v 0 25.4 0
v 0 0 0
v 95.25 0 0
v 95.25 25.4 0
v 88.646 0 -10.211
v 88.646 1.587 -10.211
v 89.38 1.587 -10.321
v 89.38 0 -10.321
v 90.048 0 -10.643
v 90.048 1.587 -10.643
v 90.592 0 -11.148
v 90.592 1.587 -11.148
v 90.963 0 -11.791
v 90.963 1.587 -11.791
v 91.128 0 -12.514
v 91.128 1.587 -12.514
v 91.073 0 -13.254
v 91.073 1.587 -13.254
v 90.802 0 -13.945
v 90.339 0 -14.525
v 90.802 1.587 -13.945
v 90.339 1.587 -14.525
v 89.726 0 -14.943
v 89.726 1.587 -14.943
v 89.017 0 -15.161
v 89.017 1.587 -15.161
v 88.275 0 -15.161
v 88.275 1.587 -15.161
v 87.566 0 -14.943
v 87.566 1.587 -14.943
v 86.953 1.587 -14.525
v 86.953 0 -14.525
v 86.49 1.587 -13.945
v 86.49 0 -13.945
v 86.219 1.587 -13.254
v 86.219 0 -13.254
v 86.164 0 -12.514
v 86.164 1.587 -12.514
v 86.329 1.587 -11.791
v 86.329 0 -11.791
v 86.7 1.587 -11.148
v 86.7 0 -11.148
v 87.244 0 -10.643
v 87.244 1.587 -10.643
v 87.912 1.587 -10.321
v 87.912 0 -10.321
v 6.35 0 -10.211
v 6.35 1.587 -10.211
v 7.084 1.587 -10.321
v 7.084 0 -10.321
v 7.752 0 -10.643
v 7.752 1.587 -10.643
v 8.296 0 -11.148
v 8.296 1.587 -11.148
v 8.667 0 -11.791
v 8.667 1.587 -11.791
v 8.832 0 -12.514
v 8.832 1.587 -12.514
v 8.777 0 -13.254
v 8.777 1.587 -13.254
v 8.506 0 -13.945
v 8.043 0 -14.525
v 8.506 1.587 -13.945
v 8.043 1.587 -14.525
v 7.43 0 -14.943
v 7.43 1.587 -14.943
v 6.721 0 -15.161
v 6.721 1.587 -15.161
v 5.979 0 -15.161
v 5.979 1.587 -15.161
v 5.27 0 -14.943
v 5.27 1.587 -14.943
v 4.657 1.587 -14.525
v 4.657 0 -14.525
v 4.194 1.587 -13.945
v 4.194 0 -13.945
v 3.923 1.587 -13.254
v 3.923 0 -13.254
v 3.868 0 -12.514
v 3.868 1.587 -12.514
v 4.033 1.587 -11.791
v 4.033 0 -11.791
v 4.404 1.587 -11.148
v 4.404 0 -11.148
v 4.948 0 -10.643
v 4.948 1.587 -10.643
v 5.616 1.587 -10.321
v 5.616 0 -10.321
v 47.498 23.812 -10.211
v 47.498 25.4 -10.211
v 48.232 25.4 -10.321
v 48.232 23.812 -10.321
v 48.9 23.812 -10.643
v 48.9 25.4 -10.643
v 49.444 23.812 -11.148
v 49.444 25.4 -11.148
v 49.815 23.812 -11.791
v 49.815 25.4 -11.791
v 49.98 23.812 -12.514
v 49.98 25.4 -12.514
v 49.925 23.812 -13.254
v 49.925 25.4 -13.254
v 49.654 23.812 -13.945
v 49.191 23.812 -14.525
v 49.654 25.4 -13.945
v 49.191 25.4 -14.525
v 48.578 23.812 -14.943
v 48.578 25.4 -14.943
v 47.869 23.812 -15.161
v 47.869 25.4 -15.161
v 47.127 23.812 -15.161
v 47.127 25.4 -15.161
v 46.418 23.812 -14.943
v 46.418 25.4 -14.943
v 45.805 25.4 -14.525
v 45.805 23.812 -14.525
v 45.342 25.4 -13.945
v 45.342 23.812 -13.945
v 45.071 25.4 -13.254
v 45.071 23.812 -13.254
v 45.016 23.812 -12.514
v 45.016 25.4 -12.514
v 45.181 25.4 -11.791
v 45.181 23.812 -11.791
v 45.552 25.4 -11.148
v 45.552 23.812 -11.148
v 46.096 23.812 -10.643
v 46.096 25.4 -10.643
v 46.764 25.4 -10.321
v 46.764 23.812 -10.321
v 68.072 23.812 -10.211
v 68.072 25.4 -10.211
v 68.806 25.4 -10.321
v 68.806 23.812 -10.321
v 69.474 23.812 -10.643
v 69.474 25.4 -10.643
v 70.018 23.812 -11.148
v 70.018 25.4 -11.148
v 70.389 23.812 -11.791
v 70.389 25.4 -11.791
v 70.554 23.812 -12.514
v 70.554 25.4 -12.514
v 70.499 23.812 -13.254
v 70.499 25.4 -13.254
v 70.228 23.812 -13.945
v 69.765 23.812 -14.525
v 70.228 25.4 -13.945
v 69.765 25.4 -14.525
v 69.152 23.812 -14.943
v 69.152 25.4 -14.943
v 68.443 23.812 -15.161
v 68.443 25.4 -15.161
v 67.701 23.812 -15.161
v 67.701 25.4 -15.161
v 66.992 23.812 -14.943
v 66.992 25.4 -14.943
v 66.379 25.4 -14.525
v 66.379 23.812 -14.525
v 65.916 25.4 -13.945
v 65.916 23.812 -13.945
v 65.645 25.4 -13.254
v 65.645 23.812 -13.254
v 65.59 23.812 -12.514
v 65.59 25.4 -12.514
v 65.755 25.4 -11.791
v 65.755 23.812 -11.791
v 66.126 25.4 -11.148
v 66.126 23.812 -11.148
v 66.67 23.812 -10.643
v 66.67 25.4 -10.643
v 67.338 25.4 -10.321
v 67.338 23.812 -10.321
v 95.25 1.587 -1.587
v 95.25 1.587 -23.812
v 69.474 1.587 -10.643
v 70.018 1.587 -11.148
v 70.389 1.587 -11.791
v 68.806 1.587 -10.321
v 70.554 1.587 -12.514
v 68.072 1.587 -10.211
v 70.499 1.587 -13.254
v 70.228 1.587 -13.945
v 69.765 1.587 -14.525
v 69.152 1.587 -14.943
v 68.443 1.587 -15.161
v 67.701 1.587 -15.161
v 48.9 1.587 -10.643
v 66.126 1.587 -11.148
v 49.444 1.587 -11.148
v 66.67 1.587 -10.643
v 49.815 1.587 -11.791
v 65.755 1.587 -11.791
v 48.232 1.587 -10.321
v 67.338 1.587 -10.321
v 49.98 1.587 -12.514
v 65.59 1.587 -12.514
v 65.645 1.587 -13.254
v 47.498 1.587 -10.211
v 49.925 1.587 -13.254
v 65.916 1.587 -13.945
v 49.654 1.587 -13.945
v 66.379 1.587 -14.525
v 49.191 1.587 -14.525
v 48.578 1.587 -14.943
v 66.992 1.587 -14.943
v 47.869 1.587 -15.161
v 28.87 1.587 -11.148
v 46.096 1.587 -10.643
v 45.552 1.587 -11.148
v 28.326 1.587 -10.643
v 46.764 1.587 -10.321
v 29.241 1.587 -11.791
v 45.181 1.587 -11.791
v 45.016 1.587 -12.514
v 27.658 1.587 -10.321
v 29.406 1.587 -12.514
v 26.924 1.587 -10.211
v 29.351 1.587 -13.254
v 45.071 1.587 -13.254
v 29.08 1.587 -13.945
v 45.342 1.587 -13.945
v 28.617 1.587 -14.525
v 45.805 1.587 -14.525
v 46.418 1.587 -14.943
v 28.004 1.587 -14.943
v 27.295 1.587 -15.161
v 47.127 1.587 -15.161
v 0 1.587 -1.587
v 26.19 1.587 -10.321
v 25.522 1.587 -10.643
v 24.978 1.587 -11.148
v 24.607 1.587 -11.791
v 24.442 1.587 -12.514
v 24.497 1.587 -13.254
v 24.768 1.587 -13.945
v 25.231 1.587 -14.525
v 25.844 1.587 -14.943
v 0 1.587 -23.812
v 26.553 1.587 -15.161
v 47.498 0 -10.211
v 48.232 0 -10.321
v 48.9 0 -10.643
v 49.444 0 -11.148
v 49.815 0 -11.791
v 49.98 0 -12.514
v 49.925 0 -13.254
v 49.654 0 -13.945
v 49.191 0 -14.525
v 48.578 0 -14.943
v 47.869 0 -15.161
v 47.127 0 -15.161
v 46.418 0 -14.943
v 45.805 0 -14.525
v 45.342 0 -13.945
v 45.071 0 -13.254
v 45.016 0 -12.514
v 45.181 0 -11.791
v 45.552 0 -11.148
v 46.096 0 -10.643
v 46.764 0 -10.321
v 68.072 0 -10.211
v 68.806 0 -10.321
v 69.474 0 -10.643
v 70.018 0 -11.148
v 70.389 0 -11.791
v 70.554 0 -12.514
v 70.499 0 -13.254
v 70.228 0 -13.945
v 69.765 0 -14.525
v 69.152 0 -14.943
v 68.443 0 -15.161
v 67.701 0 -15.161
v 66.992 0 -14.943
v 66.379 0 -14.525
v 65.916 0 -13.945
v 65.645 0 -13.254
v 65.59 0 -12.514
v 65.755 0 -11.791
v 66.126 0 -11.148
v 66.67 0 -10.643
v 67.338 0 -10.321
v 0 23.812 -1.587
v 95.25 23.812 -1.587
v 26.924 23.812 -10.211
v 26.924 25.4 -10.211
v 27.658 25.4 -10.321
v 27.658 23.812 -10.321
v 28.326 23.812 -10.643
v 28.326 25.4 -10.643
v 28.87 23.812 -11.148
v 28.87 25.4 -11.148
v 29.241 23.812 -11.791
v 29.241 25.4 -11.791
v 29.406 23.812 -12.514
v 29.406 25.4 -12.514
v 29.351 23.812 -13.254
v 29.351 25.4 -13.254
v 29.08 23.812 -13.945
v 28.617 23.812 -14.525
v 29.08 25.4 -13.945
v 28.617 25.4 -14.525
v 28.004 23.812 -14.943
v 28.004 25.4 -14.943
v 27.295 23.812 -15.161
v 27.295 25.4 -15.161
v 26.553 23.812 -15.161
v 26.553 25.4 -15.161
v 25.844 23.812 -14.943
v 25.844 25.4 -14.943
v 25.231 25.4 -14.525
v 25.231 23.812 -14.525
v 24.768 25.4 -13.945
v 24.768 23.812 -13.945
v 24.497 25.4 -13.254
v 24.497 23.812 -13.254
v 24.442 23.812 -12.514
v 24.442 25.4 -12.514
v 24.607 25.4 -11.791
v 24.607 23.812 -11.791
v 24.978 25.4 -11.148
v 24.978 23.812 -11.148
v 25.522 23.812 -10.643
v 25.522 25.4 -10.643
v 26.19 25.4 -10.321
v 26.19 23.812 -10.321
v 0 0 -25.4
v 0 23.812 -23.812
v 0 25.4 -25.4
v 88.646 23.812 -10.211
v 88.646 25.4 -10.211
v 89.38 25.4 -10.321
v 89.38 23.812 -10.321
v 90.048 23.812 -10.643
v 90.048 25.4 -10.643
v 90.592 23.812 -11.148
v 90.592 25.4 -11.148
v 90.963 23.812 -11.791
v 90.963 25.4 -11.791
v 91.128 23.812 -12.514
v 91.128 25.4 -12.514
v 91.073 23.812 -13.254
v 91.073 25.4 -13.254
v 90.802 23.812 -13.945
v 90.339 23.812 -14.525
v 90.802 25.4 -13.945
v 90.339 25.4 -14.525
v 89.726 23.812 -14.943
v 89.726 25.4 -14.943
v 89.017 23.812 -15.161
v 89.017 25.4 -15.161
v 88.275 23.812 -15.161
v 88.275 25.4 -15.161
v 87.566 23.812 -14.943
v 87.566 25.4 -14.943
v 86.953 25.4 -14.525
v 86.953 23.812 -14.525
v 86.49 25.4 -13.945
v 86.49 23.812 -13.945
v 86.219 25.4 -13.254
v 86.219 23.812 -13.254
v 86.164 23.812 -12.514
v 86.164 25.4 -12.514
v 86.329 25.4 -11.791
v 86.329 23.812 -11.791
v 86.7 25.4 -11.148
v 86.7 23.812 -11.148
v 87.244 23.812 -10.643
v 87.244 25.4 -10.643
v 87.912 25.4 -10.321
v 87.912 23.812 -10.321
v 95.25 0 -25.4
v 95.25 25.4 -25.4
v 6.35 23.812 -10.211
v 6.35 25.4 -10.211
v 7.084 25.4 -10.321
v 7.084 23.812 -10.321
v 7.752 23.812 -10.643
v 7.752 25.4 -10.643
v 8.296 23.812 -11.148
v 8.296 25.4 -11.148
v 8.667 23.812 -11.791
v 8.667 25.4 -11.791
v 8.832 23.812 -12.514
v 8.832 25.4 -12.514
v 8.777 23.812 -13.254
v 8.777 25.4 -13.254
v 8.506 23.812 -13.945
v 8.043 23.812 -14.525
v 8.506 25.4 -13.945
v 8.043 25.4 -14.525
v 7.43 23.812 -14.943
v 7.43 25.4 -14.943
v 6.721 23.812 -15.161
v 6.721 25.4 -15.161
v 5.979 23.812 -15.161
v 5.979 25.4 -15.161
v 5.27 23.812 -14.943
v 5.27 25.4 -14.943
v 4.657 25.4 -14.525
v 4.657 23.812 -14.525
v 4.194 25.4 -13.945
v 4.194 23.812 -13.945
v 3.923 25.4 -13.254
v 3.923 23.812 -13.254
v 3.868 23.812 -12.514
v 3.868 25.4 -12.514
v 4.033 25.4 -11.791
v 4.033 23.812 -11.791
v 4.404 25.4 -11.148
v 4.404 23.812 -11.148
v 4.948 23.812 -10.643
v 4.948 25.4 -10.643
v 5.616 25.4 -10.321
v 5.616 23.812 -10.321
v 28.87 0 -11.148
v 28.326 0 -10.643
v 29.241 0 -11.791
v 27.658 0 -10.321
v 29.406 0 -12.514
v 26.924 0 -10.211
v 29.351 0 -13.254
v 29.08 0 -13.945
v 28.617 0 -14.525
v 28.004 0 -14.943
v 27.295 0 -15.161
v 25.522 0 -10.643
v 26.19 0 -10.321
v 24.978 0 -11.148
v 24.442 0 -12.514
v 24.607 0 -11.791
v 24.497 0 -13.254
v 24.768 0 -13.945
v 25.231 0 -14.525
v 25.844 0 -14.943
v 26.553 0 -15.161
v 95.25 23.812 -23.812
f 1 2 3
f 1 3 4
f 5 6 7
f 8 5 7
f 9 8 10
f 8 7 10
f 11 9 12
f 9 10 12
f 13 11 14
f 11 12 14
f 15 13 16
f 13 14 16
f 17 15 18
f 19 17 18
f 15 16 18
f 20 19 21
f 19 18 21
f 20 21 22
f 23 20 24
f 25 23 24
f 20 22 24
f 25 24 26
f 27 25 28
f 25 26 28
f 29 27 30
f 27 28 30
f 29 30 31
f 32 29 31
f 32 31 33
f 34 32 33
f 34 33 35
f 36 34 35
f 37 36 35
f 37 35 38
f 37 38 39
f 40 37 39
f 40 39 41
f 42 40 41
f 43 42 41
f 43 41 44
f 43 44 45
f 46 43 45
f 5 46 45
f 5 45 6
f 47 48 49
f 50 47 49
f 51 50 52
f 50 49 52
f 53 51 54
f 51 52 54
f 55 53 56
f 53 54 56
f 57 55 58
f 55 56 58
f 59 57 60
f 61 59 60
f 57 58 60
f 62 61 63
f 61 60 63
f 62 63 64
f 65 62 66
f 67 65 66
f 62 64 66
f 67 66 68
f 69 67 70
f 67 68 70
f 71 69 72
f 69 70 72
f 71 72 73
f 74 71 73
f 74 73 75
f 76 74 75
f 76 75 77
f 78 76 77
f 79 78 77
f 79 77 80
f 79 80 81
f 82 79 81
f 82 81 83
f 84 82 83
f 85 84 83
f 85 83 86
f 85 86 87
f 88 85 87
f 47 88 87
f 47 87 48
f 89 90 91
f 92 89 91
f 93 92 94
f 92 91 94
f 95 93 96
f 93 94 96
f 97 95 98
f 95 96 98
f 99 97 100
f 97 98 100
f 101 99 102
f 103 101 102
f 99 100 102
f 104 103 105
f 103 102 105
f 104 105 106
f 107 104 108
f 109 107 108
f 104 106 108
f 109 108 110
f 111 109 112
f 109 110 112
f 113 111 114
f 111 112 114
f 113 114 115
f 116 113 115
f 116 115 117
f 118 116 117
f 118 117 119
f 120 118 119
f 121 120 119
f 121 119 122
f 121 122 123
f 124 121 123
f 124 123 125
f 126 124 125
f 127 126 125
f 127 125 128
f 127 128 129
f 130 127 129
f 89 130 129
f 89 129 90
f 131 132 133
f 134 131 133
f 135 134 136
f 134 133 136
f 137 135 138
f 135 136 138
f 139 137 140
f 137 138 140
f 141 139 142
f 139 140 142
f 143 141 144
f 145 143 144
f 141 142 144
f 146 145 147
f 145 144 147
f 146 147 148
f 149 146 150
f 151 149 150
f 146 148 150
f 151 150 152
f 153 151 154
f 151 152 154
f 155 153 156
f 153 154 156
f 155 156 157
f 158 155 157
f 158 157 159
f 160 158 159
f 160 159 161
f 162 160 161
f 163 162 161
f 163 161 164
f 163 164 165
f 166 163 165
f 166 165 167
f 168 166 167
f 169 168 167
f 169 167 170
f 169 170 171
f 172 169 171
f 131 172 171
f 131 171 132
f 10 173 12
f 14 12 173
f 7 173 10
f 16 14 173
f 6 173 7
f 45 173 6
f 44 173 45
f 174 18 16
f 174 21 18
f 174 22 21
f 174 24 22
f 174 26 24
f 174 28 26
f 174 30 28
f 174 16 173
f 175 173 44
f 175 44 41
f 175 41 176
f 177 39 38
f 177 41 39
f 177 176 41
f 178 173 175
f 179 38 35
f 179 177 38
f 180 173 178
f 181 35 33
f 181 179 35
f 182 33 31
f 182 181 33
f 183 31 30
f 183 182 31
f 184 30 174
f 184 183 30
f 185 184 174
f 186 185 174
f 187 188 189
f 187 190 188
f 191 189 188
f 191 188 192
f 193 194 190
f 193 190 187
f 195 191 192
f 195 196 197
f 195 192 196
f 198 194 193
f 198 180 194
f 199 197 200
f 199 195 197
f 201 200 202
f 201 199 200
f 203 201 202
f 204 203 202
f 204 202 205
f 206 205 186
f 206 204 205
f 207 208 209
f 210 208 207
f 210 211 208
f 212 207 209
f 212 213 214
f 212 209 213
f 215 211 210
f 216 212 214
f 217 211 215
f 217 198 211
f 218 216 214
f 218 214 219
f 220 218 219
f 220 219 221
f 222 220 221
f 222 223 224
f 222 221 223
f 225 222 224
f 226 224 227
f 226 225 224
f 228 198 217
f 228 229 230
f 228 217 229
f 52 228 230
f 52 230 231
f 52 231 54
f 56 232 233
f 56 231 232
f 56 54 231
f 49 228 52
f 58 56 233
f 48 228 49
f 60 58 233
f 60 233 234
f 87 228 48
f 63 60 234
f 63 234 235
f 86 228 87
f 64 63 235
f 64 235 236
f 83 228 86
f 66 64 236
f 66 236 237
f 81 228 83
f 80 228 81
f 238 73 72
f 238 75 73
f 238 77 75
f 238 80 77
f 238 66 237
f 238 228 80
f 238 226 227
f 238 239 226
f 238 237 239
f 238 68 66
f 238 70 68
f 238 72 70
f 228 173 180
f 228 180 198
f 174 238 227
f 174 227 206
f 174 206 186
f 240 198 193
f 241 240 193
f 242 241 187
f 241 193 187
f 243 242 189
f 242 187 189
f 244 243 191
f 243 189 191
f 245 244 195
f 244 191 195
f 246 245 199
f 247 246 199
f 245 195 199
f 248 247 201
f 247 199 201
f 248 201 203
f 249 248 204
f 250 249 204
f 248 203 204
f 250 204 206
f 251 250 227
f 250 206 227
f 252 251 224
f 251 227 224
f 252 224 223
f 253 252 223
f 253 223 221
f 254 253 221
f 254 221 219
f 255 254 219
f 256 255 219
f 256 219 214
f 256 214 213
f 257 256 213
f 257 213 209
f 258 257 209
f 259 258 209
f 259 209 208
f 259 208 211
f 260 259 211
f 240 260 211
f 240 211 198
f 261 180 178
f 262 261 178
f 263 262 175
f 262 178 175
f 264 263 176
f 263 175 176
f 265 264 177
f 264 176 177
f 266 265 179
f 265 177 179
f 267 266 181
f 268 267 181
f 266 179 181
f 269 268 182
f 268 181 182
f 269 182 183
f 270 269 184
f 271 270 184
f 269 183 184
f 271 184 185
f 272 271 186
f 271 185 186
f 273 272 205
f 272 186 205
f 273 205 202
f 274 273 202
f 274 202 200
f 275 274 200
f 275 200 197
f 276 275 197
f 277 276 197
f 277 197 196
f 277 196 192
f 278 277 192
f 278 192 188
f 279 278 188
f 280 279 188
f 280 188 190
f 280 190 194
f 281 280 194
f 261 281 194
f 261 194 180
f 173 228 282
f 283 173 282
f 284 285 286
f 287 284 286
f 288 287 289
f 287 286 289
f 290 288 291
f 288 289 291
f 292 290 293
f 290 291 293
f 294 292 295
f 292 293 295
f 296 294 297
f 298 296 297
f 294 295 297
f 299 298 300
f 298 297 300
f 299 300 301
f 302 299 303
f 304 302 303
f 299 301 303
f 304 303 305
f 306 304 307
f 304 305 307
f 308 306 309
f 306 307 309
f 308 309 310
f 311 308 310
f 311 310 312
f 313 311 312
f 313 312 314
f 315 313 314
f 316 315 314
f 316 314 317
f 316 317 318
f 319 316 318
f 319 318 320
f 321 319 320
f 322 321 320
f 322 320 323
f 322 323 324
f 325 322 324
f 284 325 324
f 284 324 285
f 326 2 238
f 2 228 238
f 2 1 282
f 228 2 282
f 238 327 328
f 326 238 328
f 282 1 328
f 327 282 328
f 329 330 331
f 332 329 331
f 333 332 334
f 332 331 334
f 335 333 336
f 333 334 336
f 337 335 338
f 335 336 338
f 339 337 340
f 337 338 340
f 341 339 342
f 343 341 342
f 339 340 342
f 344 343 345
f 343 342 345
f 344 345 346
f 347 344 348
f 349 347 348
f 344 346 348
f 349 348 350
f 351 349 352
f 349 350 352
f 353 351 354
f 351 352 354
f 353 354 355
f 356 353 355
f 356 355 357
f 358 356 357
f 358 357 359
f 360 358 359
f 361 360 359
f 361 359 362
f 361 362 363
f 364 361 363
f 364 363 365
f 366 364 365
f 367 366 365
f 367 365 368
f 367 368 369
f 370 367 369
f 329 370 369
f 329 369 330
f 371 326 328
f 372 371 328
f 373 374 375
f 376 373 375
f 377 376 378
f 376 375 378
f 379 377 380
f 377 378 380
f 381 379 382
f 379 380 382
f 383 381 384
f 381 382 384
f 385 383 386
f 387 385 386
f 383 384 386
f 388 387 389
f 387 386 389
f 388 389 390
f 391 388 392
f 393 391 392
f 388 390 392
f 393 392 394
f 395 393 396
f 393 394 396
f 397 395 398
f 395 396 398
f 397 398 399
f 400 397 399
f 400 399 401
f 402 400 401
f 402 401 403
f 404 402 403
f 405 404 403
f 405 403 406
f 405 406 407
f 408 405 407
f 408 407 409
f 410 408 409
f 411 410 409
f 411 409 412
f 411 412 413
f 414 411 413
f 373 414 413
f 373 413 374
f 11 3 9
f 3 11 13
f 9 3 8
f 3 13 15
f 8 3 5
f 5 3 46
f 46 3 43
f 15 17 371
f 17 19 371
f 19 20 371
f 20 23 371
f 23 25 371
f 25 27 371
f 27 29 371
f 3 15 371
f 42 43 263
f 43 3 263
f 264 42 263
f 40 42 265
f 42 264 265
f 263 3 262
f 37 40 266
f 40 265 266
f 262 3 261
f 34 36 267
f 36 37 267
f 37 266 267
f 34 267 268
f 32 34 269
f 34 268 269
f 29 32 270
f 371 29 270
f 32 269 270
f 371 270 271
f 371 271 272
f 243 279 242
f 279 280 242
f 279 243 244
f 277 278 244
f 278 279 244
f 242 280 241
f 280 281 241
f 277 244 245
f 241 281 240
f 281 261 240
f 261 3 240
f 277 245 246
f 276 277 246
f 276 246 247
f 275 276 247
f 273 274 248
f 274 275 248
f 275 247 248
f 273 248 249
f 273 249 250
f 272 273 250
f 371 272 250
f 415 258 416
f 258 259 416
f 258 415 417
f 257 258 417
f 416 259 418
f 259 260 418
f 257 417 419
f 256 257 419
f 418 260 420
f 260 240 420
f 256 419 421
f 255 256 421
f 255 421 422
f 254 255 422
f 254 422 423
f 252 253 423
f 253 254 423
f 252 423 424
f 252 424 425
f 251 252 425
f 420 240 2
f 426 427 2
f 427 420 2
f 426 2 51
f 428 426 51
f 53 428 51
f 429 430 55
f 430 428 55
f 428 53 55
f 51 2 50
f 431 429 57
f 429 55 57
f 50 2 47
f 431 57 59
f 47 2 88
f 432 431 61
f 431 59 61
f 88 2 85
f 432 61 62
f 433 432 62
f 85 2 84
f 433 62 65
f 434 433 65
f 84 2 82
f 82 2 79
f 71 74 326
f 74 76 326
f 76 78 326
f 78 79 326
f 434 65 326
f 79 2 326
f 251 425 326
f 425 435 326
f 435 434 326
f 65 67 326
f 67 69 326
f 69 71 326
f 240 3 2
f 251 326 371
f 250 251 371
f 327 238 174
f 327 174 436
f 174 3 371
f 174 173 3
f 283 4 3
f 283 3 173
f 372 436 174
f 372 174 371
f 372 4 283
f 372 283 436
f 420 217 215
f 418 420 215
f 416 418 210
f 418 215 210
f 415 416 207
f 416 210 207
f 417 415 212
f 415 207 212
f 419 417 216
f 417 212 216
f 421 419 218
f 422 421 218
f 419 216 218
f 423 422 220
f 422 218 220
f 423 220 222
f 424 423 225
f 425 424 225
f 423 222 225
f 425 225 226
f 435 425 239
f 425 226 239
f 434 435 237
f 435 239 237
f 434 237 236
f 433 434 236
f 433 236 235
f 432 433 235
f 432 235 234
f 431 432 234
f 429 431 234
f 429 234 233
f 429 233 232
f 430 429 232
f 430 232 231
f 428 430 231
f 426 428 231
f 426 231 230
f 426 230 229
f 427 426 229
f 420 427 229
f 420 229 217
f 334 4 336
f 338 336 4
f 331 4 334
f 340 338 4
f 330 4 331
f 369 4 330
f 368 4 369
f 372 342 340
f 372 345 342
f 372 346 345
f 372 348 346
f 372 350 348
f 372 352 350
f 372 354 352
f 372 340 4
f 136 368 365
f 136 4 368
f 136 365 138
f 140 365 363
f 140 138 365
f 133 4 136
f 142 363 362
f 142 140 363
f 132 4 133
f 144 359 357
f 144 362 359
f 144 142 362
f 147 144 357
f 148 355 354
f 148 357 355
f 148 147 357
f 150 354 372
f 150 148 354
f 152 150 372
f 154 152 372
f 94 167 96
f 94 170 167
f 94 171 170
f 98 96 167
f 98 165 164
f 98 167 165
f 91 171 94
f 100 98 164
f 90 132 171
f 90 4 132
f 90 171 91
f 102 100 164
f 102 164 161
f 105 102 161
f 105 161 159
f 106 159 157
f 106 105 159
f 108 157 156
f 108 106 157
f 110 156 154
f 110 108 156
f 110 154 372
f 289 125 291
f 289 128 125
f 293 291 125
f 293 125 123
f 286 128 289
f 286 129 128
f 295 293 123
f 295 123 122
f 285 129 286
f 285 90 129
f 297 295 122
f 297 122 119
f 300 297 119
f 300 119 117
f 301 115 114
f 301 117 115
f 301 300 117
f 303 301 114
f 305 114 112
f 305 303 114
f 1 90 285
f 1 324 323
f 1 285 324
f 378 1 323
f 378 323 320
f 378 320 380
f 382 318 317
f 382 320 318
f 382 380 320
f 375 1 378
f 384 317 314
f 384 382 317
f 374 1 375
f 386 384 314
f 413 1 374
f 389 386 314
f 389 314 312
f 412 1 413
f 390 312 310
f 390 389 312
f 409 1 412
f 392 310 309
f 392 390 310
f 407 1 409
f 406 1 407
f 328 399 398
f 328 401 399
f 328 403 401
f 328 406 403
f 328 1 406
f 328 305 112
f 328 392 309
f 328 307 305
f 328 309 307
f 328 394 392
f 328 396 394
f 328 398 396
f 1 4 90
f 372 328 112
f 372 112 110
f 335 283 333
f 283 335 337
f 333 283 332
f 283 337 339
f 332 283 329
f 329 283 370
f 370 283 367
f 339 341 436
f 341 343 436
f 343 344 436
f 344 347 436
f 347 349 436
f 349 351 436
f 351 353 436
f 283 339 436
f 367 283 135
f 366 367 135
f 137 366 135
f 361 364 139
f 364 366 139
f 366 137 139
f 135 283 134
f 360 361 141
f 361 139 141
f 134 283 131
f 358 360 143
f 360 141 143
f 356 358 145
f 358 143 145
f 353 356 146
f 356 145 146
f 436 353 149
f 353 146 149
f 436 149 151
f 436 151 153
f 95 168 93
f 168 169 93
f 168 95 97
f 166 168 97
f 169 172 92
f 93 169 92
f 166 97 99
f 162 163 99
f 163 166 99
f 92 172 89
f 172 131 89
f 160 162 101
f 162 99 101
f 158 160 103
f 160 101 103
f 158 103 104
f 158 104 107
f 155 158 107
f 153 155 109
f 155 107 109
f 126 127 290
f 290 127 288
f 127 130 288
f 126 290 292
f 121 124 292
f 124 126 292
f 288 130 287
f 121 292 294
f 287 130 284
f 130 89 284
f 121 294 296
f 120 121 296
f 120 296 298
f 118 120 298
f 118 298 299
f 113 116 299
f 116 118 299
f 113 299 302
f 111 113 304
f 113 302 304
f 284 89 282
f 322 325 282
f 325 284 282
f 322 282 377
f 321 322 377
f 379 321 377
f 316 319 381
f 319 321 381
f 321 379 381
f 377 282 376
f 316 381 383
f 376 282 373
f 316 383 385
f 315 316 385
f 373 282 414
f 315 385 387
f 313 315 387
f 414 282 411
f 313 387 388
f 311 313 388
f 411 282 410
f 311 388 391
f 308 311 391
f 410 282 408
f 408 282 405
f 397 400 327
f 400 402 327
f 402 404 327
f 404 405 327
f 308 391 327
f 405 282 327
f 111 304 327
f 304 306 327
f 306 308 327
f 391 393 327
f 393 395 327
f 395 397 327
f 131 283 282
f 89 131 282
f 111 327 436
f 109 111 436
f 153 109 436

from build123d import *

# Parameters (mm, degrees)
SKETCH1_W           = 25.4
SKETCH1_H           = 25.4
SKETCH1_W_2         = 22.225
SKETCH1_H_2         = 22.225
BOSS_EXTRUDE1_DEPTH = 95.25
SKETCH2_R           = 2.4892
CUT_EXTRUDE1_DEPTH  = 95.25


with BuildPart() as part:
    # Sketch1 → Boss-Extrude1 (new body)
    with BuildSketch(Plane(origin=(0, 0, 0), x_dir=(0, 0, -1), z_dir=(1, 0, 0))):
        with Locations((12.7, 12.7)):
            Rectangle(SKETCH1_W, SKETCH1_H)
        with Locations((12.7, 12.7)):
            Rectangle(SKETCH1_W_2, SKETCH1_H_2, mode=Mode.SUBTRACT)
    extrude(amount=BOSS_EXTRUDE1_DEPTH)

    # Sketch2 → Cut-Extrude1 (cut)
    with BuildSketch(Plane(origin=(0, 25.4, 0), x_dir=(1, 0, 0), z_dir=(0, 1, 0))):
        with Locations(Location((6.35, 12.7, 0), (0, 0, 270))):
            Circle(SKETCH2_R)
        with Locations(Location((26.924, 12.7, 0), (0, 0, 270))):
            Circle(SKETCH2_R)
        with Locations(Location((47.498, 12.7, 0), (0, 0, 270))):
            Circle(SKETCH2_R)
        with Locations(Location((68.072, 12.7, 0), (0, 0, 270))):
            Circle(SKETCH2_R)
        with Locations(Location((88.646, 12.7, 0), (0, 0, 270))):
            Circle(SKETCH2_R)
    extrude(amount=-CUT_EXTRUDE1_DEPTH, mode=Mode.SUBTRACT)


solid = part.part
